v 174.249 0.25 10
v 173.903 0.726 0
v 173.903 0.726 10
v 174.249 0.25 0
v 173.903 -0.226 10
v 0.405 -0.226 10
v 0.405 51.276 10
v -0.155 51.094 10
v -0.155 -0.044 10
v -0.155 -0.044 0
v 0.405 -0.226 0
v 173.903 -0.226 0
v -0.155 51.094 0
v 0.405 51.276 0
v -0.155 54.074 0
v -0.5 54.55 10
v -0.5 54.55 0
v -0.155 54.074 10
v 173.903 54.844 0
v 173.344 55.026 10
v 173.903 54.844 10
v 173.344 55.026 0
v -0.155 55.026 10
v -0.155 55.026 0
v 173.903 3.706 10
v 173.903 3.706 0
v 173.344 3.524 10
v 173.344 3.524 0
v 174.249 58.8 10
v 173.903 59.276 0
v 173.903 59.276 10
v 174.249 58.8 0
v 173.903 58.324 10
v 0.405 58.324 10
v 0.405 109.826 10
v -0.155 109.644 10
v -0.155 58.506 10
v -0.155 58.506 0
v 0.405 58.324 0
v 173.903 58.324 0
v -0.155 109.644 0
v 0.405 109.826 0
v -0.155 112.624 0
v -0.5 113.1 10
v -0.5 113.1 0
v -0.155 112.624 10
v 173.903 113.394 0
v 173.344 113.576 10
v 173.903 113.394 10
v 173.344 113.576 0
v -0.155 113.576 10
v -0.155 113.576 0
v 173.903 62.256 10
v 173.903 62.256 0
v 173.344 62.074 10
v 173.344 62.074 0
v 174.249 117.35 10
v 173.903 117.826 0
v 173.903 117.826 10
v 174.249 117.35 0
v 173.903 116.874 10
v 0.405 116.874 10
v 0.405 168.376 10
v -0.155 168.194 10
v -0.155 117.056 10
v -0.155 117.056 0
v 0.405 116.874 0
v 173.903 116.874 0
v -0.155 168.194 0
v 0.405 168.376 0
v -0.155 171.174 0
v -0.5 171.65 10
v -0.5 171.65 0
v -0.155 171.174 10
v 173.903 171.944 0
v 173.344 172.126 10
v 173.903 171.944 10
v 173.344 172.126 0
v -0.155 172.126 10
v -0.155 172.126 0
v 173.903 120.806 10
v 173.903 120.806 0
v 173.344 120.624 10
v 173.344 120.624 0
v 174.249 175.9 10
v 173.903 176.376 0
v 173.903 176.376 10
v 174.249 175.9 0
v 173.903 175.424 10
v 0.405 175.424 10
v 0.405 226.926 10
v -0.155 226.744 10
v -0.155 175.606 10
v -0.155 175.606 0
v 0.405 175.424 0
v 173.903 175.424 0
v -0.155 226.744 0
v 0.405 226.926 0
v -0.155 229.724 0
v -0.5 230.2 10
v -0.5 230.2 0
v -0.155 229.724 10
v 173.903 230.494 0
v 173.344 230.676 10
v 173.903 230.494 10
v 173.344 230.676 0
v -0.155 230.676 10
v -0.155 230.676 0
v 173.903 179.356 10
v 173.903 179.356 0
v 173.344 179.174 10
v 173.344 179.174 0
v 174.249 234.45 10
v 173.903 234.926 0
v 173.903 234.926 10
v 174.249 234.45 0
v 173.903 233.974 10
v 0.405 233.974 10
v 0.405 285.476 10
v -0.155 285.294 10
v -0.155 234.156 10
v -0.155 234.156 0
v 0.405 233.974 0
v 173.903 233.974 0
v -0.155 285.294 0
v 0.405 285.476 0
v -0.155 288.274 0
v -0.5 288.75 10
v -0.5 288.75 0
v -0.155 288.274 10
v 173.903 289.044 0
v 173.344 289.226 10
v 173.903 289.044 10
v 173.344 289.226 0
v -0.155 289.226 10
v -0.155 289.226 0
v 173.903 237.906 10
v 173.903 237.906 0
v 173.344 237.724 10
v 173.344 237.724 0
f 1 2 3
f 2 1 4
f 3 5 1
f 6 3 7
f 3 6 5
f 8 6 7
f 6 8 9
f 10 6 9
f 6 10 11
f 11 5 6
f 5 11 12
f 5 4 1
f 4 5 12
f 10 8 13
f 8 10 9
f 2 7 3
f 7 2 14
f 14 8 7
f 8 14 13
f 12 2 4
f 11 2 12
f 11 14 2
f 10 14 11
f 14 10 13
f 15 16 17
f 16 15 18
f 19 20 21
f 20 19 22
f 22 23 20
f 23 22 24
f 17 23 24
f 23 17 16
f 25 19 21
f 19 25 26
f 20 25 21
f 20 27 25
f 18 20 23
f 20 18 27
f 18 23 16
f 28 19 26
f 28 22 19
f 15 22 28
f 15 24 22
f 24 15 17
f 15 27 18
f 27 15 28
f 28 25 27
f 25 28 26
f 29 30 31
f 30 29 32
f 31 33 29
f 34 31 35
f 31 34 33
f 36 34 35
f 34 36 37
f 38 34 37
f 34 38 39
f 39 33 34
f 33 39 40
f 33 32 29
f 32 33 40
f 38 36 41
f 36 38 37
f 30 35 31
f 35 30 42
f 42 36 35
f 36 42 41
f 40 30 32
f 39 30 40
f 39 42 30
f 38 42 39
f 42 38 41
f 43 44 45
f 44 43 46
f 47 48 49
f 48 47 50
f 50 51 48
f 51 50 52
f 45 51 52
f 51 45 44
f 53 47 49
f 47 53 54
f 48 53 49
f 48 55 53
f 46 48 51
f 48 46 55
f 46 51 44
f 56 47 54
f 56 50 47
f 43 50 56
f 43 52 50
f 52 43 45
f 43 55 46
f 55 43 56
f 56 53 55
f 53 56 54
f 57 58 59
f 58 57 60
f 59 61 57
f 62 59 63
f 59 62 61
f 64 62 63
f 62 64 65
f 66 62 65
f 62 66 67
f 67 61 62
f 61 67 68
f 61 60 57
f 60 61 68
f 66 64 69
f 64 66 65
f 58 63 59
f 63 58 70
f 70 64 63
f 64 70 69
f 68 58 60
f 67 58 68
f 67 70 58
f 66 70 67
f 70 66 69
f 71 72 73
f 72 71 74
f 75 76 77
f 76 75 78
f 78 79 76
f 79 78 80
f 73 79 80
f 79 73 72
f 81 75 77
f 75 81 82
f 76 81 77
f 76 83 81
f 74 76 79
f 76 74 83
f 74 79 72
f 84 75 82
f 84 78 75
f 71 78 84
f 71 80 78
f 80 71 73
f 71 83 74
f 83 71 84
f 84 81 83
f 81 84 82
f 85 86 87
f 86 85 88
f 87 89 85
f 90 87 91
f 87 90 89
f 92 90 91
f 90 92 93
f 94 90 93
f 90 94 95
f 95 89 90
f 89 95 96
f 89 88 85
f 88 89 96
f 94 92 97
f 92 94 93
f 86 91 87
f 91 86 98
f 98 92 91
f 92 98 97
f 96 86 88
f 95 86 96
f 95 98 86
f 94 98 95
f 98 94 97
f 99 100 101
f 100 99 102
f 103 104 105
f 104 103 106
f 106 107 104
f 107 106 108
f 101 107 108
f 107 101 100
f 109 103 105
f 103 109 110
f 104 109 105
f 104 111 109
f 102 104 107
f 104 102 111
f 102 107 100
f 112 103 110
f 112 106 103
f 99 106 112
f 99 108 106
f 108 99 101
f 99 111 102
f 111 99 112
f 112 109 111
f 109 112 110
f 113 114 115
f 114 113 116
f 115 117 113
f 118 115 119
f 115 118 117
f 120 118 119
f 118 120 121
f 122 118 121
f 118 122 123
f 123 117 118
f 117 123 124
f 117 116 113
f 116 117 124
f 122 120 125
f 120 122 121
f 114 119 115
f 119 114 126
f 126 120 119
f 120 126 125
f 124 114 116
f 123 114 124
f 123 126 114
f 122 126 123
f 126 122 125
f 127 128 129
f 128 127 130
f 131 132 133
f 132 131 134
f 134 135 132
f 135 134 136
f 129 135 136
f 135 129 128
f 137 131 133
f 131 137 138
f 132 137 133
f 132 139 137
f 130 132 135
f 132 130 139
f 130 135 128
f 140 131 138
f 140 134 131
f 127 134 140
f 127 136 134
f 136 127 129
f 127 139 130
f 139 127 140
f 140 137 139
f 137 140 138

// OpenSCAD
// file: ../libs/bearing_mount_lib.scad
module rounded_rect_x (r, l, h) {
   $rect_l = l;
   $rect_w = 4 * r;
   $rect_h = h;
   union () {
	   translate([2*r, 0, 0]) {
		    cube([$rect_l, $rect_w, $rect_h]);
	   }
	   translate([2*r, 2*r, 0]) {
		    cylinder(r=2*r, h=h);
	   }
	   translate([2*r+l, 2*r, 0]) {
		    cylinder(r=2*r, h=h);
	   }  
   }
}

module rounded_rect_p_x (r, l, h) {
   difference () {
      rounded_rect_x(r, l, h);
      translate([2*r, 2*r, -1])  {
         cylinder(r=r, h=h+2);
      }  
      translate([2*r, l+2*r, -1])  {
         cylinder(r=r, h=h+2);
      } 
   }
}

module rounded_rect_y (r, l, h) {
   $rect_l = l;
   $rect_w = 4 * r;
   $rect_h = h;
   union () {
	   translate([0, 2*r, 0]) {
		    cube([$rect_w, $rect_l, $rect_h]);
	   }
	   translate([2*r, 2*r, 0]) {
		    cylinder(r=2*r, h=h);
	   }
	   translate([2*r, 2*r+l, 0]) {
		    cylinder(r=2*r, h=h);
	   }  
   }
}


module rounded_rect_p_y (r, l, h) {
   difference () {
      rounded_rect_y(r, l, h);
      translate([2*r, 2*r, -1])  {
         cylinder(r=r, h=h+2);
      }  
      translate([2*r, l+2*r, -1])  {
         cylinder(r=r, h=h+2);
      } 
   }
}

$pierced = 1;
if (1 == $pierced) {
   union () {
      rounded_rect_p_x(r=5, l=60, h=6.35);
      rounded_rect_p_y(r=5, l=60, h=6.35);
   }
} else {
   union () {
      rounded_rect_x(r=5, l=60, h=6.35);
      rounded_rect_y(r=5, l=60, h=6.35);
   }
}

module mitered_box_x (ww, ll, hh) {
   $rr=ww/3;
   $lll = ll - 2*$rr; 
   translate ([$rr,$rr,0]) {
      minkowski() {
         cube([$lll,$rr,hh]);
         cylinder(r=$rr,h=hh);
      }
   }
}

module mitered_box_y (ww, ll, hh) {
   $rr=ww/3;
   $lll = ll - 2*$rr; 
   translate ([$rr,$rr,0]) {
      minkowski() {
         cube([$rr,$lll,hh]);
         cylinder(r=$rr,h=hh);
      }
   }
}

module duemilanove_hole_pattern_x (depth) {
    translate([0,0,0]) {
       cylinder(r=1.5,h=depth);
    }
    translate([0,27.9,0]) {
       cylinder(r=1.5,h=depth);
    }
    translate([50.8,27.9 + 15.2,0]) {
       cylinder(r=1.5,h=depth);
    }
}

module duemilanove_hole_pattern_y (depth) {
    translate([0,0,0]) {
       cylinder(r=1.5,h=depth);
    }
    translate([27.9,0,0]) {
       cylinder(r=1.5,h=depth);
    }
    translate([27.9 + 15.2, 50.8,0]) {
       cylinder(r=1.5,h=depth);
    }
}

module workspace_bounds(x, y) {
   translate([-5, -5, 0]) {
      difference() {
         translate([0,0,0]) {
             cube([x+10,y+10,$eigth]);
         }
         translate([5,5,-1]) {
             cube([x,y,$eigth+2]);
         }
      }
   }
}
// main file
use <../libs/bearing_mount_lib.scad>

$inch = 25.4;
$half = $inch/2;
$quarter = $inch/4;
$eigth = $inch/8;
$sixteenth = $inch/16;
$thirtysecondth = $inch/32;

$yy = 2 * 25.4 - 0.25;
$xx = (6.8385396 * 25.4) - 0.2;

module make_parts () {
    translate([0,0,0]) {
       make_2_parts();
    }
    translate([0,$yy+8,0]) {
       make_2_parts();
    }
    translate([0,2*$yy+16,0]) {
       make_2_parts();
    }
    translate([0,3*$yy+24,0]) {
       make_2_parts();
    }
    translate([0,4*$yy+32,0]) {
       make_2_parts();
    }
}

module make_2_parts() {
	translate([0.25,0.25,0]) {
      make_ramp();
   } 

   translate([$xx,$yy+4,0]) {
      rotate([180,180,0]) {
         make_ramp();
      }
   } 
}

module make_ramp () {
   hull() {
          translate([0,0,0]) {
             cylinder(r=0.5, h=10);
          }
          translate([$xx,0,0]) {
             cylinder(r=0.5, h=10);
          }
          translate([0,$yy,0]) {
             cylinder(r=0.5, h=10);
          } 
      }
}


module make_workspace_bounds(x, y) {
   translate([-5, -5, 0]) {
      difference() {
         translate([0,0,0]) {
             cube([x+10,y+10,$eigth]);
         }
         translate([5,5,-1]) {
             cube([x,y,$eigth+2]);
         }
      }
   }
}

$2d = 0;
if ($2d) {
    projection(cut=true) {
       translate([0,0,0]) rotate([0,0,0]) {
         make_parts();
       }
   }
} else {
    make_parts();
//    make_workspace_bounds(290,290);
}
